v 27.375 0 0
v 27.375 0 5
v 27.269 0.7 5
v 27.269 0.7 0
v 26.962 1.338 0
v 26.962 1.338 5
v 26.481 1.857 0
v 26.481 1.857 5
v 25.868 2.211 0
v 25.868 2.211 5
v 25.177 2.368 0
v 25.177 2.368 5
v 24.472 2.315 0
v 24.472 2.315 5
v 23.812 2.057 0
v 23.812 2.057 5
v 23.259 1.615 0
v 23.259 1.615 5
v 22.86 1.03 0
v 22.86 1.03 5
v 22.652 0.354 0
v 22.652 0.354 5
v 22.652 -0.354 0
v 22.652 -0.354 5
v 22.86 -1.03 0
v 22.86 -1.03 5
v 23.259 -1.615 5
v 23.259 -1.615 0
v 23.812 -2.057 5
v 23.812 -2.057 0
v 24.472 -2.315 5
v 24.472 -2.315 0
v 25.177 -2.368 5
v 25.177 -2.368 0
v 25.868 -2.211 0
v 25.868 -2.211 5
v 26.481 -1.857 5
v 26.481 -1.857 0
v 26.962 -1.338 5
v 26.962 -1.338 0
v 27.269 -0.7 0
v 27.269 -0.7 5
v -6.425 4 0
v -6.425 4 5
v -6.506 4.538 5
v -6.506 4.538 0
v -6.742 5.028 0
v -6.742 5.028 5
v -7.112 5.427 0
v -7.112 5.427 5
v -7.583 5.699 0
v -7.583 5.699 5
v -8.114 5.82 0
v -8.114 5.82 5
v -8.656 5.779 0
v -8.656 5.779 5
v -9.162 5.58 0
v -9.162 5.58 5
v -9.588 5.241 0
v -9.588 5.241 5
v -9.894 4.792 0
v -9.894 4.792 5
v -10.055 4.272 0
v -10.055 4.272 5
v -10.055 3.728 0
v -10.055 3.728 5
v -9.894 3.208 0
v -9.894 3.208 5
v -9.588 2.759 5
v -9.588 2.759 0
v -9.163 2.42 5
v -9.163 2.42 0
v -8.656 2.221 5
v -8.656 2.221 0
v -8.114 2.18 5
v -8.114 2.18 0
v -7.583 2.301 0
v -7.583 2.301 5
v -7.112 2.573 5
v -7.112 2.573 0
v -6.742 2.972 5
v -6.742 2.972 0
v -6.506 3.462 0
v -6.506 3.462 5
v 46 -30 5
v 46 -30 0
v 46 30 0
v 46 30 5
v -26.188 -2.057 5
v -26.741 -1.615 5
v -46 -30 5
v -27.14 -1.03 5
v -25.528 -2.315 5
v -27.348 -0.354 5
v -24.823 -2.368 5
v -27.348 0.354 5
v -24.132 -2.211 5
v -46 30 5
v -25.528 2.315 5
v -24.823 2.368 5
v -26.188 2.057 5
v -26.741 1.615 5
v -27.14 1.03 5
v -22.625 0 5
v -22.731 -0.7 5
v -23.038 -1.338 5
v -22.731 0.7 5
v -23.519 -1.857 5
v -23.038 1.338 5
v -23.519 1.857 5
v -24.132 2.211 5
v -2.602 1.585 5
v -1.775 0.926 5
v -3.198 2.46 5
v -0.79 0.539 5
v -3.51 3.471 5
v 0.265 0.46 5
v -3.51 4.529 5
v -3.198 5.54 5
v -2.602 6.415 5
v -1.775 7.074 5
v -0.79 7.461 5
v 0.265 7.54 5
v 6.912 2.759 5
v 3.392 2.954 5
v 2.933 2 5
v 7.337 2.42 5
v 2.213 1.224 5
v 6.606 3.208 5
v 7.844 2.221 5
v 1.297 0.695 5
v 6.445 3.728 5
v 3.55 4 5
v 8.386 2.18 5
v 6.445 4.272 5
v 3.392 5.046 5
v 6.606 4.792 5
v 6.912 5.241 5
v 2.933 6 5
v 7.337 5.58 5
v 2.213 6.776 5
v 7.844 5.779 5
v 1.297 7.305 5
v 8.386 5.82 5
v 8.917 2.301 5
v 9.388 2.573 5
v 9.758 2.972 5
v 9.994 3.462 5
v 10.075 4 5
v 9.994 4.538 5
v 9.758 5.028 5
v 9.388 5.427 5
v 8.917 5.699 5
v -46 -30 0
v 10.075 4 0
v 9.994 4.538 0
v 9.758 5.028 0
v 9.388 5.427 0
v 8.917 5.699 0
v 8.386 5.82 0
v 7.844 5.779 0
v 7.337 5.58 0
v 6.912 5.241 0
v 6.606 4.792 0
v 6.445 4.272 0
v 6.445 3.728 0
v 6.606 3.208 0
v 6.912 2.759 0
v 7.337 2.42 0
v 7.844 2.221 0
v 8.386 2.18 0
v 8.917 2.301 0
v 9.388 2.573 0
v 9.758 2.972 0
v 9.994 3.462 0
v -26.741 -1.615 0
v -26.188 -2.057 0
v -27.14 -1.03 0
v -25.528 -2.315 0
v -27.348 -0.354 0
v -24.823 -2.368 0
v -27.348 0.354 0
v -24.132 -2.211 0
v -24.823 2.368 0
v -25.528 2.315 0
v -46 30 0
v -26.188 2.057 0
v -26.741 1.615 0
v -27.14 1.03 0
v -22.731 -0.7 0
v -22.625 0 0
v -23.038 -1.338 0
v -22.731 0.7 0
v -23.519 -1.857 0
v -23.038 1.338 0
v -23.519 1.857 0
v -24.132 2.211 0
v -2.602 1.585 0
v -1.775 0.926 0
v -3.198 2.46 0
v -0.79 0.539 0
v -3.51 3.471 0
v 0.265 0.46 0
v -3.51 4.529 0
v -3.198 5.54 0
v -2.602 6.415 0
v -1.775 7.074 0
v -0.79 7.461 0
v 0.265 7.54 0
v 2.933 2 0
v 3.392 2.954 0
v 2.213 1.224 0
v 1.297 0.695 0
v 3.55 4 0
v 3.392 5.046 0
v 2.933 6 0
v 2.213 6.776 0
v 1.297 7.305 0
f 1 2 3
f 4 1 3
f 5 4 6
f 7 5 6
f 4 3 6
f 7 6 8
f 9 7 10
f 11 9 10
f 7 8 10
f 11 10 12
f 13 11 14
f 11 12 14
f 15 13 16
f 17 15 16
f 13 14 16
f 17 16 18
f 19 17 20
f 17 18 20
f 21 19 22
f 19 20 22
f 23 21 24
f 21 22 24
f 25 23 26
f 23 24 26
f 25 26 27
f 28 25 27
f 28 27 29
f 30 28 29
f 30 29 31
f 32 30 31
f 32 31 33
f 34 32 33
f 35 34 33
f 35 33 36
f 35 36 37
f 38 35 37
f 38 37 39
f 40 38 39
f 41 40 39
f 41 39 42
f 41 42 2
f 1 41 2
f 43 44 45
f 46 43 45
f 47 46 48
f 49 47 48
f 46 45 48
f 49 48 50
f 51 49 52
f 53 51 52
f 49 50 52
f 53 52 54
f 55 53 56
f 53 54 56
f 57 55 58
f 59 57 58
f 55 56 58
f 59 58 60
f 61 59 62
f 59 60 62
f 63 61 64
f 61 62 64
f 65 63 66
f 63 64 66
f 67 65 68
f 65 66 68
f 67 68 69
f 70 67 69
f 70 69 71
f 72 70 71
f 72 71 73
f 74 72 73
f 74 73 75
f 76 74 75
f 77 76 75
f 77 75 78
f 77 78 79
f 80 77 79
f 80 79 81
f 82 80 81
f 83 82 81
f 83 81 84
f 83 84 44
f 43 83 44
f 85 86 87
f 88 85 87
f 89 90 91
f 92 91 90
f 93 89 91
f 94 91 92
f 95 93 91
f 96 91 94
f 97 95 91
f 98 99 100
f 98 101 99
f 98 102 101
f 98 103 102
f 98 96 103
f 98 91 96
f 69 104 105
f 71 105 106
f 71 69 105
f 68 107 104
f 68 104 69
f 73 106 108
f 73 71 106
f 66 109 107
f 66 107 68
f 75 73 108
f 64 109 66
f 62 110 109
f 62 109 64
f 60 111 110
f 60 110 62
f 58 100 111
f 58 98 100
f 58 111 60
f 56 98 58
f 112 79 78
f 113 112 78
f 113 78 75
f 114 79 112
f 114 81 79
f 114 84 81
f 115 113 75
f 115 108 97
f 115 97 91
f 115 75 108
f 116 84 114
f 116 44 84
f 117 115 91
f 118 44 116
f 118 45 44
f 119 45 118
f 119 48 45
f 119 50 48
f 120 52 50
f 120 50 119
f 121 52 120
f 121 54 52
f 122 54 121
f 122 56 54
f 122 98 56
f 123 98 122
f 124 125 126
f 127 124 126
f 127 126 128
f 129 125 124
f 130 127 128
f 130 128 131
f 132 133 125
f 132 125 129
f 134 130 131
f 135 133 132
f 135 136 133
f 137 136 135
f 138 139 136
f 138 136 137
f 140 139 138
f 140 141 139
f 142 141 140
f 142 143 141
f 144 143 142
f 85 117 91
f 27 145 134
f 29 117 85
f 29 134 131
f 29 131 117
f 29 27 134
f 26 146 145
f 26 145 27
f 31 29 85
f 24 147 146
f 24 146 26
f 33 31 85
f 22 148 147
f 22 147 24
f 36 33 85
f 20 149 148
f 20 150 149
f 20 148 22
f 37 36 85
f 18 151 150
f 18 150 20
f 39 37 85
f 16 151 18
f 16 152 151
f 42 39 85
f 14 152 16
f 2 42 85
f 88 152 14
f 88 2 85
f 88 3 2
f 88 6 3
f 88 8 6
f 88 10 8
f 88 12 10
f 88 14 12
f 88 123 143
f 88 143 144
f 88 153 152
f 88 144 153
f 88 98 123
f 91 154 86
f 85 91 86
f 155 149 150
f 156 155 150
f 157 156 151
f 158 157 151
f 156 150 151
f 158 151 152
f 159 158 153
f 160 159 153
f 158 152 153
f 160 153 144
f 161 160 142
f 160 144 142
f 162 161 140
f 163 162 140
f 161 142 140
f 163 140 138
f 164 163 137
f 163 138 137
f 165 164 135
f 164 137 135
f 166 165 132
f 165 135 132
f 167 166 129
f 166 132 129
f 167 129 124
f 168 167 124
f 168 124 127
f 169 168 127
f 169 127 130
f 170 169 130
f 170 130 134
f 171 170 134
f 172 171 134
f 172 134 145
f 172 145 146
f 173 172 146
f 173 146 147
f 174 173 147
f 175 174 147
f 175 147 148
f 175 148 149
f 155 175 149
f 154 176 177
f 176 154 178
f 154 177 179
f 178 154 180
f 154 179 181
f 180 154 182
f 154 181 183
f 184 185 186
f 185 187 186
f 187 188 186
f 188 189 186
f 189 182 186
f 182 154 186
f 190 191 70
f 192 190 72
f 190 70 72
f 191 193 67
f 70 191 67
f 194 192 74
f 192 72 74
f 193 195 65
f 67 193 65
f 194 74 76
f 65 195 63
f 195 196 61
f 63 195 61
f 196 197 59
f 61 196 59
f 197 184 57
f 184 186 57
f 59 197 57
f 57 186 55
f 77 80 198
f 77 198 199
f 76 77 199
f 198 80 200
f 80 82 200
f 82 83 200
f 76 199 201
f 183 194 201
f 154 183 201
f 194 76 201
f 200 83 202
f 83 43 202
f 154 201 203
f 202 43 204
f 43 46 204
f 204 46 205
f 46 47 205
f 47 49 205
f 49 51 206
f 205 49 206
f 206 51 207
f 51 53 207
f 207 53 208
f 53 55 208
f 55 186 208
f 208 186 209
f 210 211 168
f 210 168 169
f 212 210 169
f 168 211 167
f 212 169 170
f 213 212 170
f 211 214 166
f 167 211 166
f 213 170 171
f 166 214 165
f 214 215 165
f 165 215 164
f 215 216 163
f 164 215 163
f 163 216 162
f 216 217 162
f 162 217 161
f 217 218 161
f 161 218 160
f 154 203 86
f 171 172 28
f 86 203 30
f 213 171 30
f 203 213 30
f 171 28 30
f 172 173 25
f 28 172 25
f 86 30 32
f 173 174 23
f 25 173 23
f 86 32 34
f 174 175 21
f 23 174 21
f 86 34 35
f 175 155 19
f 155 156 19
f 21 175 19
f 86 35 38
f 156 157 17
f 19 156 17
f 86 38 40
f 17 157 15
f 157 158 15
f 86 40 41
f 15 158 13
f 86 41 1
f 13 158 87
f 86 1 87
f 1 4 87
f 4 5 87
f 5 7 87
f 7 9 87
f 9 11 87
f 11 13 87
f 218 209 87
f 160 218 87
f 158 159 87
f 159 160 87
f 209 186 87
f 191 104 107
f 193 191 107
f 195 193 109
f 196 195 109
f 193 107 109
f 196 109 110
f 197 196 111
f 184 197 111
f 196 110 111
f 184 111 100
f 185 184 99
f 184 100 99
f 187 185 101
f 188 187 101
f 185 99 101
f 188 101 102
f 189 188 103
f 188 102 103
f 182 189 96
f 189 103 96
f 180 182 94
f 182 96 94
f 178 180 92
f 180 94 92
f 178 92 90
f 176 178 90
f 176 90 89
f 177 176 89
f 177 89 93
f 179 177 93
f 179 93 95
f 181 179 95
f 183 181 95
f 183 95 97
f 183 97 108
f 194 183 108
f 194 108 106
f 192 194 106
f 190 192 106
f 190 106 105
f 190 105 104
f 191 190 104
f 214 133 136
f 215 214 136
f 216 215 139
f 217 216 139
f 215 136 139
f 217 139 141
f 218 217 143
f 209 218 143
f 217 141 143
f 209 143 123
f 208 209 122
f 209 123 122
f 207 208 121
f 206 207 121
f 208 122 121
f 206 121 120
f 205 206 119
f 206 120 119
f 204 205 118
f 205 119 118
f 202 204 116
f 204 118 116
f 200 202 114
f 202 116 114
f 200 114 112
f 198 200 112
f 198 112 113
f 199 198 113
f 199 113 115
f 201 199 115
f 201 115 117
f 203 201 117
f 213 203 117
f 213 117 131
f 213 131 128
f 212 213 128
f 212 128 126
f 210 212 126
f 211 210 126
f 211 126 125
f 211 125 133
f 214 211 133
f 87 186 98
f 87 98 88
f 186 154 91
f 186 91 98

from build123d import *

# Parameters (mm, degrees)
F0_W     = 92
F0_H     = 60
F1_DEPTH = 5
F2_R     = 3.55
F2_R_2   = 1.825
F2_R_3   = 2.375
F3_DEPTH = 25


with BuildPart() as f1:
    # F0 (on Top) → F1 (new body)
    with BuildSketch(Plane.XY):
        Rectangle(F0_W, F0_H)
    extrude(amount=F1_DEPTH)

    # F2 (on face) → F3 (cut)
    with BuildSketch(Plane.XY.offset(5)):
        with Locations((0, 4)):
            Circle(F2_R)
        with Locations((-8.25, 4)):
            Circle(F2_R_2)
        with Locations((8.25, 4)):
            Circle(F2_R_2)
        with Locations((-25, 0)):
            Circle(F2_R_3)
        with Locations((25, 0)):
            Circle(F2_R_3)
    extrude(amount=-F3_DEPTH, mode=Mode.SUBTRACT)


solid = f1.part
